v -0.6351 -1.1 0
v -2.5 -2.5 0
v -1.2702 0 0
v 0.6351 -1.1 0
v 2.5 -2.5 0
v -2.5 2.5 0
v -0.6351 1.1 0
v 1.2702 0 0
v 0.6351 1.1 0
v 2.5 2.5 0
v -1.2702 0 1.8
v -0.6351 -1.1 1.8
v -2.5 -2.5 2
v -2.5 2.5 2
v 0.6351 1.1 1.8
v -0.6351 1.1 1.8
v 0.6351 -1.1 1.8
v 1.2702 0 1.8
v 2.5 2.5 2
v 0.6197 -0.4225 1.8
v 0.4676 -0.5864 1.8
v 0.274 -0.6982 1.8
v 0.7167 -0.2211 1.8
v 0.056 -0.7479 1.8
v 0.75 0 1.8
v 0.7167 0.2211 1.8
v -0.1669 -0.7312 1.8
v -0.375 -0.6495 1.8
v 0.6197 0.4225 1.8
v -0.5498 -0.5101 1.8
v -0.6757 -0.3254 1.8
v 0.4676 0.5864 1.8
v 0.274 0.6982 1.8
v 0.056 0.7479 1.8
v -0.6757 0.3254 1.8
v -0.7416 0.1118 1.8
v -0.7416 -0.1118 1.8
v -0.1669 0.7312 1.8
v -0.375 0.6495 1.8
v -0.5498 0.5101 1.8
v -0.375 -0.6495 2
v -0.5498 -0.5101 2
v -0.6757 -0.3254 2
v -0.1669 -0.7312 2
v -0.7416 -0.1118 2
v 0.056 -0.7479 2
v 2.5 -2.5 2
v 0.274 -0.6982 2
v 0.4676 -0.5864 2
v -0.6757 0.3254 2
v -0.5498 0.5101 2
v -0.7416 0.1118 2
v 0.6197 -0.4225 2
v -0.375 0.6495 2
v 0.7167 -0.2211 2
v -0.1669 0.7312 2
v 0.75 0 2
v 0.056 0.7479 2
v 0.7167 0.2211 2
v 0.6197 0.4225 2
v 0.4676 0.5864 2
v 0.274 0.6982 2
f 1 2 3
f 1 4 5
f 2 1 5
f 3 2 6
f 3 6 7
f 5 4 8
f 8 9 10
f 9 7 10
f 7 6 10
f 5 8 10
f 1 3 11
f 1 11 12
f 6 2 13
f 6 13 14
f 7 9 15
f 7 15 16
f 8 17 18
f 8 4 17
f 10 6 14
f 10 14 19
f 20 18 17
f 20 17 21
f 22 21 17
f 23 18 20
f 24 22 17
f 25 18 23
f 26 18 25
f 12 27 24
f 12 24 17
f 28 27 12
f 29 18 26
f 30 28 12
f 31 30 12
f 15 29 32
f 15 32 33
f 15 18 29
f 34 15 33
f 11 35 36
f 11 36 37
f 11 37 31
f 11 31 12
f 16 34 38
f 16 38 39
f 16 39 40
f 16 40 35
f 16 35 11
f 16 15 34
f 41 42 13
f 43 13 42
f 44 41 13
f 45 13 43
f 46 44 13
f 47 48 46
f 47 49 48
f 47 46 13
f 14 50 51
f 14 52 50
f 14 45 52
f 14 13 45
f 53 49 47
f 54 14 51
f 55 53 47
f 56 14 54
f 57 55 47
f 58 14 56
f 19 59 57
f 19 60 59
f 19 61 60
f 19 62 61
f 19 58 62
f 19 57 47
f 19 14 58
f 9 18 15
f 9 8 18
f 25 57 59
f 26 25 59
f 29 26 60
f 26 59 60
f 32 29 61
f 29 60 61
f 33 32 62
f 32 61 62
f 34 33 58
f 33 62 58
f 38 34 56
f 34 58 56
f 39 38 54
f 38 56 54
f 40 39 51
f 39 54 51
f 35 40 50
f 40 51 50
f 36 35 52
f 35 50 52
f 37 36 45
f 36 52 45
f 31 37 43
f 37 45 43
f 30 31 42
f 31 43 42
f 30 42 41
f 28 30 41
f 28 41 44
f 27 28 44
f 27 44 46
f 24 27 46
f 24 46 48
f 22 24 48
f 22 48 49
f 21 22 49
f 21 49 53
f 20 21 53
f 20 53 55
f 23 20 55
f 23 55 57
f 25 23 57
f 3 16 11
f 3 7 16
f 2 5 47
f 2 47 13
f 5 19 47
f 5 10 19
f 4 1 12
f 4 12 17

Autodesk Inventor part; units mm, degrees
ref_plane "YZ Plane" through (0, 0, 0) normal (1, 0, 0) x (0, 1, 0)
ref_plane "XZ Plane" through (0, 0, 0) normal (0, 1, 0) x (-1, 0, 0)
ref_plane "XY Plane" through (0, 0, 0) normal (0, 0, 1) x (1, 0, 0)
sketch "Sketch1" plane through (0, 0, 0) normal (0, 0, 1) x (1, 0, 0)
  line L0 (-2.5, 2.5) -> (2.5, 2.5)
  line L1 (2.5, 2.5) -> (2.5, -2.5)
  line L2 (2.5, -2.5) -> (-2.5, -2.5)
  line L3 (-2.5, -2.5) -> (-2.5, 2.5)
  line L4 (-2.5, 2.5) -> (2.5, -2.5) construction
  line L5 (2.5, 2.5) -> (-2.5, -2.5) construction
  point P0 (0, 0)
  dimension "d0" = 5
  dimension "d1" = 5
extrude "Extrusion1" add sketch "Sketch1" along normal blind 2
sketch "Sketch10" plane through (0, 0, 2) normal (0, 0, 1) x (1, 0, 0)
  circle A0 centre (0, 0) radius 0.75
  dimension "d145" = 1.5
extrude "Extrusion8" cut sketch "Sketch10" against normal blind 10
sketch "Sketch11" plane through (0, 0, 0) normal (0, 0, -1) x (-1, 0, 0)
  circle A0 centre (0, 0) radius 1.1
  line L0 (0.6351, 1.1) -> (1.2702, 0)
  line L1 (1.2702, 0) -> (0.6351, -1.1)
  line L2 (0.6351, -1.1) -> (-0.6351, -1.1)
  line L3 (-0.6351, -1.1) -> (-1.2702, 0)
  line L4 (-1.2702, 0) -> (-0.6351, 1.1)
  line L5 (-0.6351, 1.1) -> (0.6351, 1.1)
  point P0 (0, 1.1)
  point P1 (-0.9526, 0.55)
  point P2 (0.9526, 0.55)
  point P3 (-0.9526, -0.55)
  point P4 (0, -1.1)
  point P5 (0.9526, -0.55)
  dimension "d148" = 2.2
extrude "Extrusion9" cut sketch "Sketch11" against normal blind 1.8
sketch "Sketch12" plane through (0, 0, 2) normal (0, 0, 1) x (1, 0, 0)
  circle A0 centre (0, 0) radius 1.3
  line L0 (2.5, 2.5) -> (-2.5, 2.5) projected
  line L1 (-2.5, -2.5) -> (2.5, -2.5) projected
  line L2 (-2.5, 2.5) -> (2.5, 2.5)
  line L3 (2.5, 2.5) -> (2.5, -2.5)
  line L4 (2.5, -2.5) -> (-2.5, -2.5)
  line L5 (-2.5, -2.5) -> (-2.5, 2.5)
  line L6 (-2.25, 2.25) -> (2.25, 2.25)
  line L7 (2.25, 2.25) -> (2.25, -2.25)
  line L8 (2.25, -2.25) -> (-2.25, -2.25)
  line L9 (-2.25, -2.25) -> (-2.25, 2.25)
  line L10 (2.5, -2.5) -> (2.5, 2.5) projected
  line L11 (-2.5, 2.5) -> (-2.5, -2.5) projected
  arc A1 (-1, -1.1843) -> (1, -1.1843) centre (0, 0) ccw
  circle A2 centre (0, 0) radius 1.55
  line L12 (-1, 2.25) -> (-1, 0.8307)
  line L13 (-0.75, 2.5) -> (-0.75, 1.0618)
  line L14 (0.75, 2.5) -> (0.75, 1.0618)
  line L15 (1, 2.5) -> (1, 0.8307)
  line L16 (-0.75, -2.25) -> (-0.75, -1.0618)
  line L17 (-1, -2.25) -> (-1, -0.8307)
  line L18 (0.75, -2.25) -> (0.75, -1.0618)
  line L19 (1, -2.25) -> (1, -0.8307)
  line L20 (-2.25, 1) -> (-0.8307, 1)
  line L21 (-2.25, 0.75) -> (-1.0618, 0.75)
  line L22 (-2.25, -0.75) -> (-1.0618, -0.75)
  line L23 (-2.25, -1) -> (-0.8307, -1)
  line L24 (0.8307, 1) -> (2.25, 1)
  line L25 (1.0618, 0.75) -> (2.25, 0.75)
  line L26 (0.8307, -1) -> (2.25, -1)
  line L27 (1.0618, -0.75) -> (2.25, -0.75)
  line L28 (-2.25, 1) -> (-2.5, 1)
  line L29 (-2.25, 0.75) -> (-2.5, 0.75)
  line L30 (-2.25, -0.75) -> (-2.5, -0.75)
  line L31 (-2.25, -1) -> (-2.5, -1)
  line L32 (-1, -2.25) -> (-1, -2.5)
  line L33 (-0.75, -2.25) -> (-0.75, -2.5)
  line L34 (0.75, -2.25) -> (0.75, -2.5)
  line L35 (1, -2.25) -> (1, -2.5)
  line L36 (2.25, -1) -> (2.5, -1)
  line L37 (2.25, -0.75) -> (2.5, -0.75)
  line L38 (2.25, 0.75) -> (2.5, 0.75)
  line L39 (2.25, 1) -> (2.5, 1)
  line L40 (-1, 2.25) -> (-1, 2.5)
  point P0 (0.75, 1.7809)
  dimension "d151" = 2.6
  dimension "d153" = 0.25
  dimension "d154" = 0.25
  dimension "d155" = 0.25
  dimension "d156" = 0.25
  dimension "d167" = 5
  dimension "d168" = 5
  dimension "d181" = 1.25
  dimension "d182" = 0.25
  dimension "d183" = 1.5
  dimension "d184" = 0.25
  dimension "d185" = 1.25
  dimension "d186" = 1.25
  dimension "d187" = 0.25
  dimension "d188" = 1.5
  dimension "d189" = 0.25
  dimension "d190" = 1.25
  dimension "d191" = 0.25
  dimension "d192" = 1.5
  dimension "d193" = 0.25
  dimension "d194" = 1.25
properties part number "SGBase"
